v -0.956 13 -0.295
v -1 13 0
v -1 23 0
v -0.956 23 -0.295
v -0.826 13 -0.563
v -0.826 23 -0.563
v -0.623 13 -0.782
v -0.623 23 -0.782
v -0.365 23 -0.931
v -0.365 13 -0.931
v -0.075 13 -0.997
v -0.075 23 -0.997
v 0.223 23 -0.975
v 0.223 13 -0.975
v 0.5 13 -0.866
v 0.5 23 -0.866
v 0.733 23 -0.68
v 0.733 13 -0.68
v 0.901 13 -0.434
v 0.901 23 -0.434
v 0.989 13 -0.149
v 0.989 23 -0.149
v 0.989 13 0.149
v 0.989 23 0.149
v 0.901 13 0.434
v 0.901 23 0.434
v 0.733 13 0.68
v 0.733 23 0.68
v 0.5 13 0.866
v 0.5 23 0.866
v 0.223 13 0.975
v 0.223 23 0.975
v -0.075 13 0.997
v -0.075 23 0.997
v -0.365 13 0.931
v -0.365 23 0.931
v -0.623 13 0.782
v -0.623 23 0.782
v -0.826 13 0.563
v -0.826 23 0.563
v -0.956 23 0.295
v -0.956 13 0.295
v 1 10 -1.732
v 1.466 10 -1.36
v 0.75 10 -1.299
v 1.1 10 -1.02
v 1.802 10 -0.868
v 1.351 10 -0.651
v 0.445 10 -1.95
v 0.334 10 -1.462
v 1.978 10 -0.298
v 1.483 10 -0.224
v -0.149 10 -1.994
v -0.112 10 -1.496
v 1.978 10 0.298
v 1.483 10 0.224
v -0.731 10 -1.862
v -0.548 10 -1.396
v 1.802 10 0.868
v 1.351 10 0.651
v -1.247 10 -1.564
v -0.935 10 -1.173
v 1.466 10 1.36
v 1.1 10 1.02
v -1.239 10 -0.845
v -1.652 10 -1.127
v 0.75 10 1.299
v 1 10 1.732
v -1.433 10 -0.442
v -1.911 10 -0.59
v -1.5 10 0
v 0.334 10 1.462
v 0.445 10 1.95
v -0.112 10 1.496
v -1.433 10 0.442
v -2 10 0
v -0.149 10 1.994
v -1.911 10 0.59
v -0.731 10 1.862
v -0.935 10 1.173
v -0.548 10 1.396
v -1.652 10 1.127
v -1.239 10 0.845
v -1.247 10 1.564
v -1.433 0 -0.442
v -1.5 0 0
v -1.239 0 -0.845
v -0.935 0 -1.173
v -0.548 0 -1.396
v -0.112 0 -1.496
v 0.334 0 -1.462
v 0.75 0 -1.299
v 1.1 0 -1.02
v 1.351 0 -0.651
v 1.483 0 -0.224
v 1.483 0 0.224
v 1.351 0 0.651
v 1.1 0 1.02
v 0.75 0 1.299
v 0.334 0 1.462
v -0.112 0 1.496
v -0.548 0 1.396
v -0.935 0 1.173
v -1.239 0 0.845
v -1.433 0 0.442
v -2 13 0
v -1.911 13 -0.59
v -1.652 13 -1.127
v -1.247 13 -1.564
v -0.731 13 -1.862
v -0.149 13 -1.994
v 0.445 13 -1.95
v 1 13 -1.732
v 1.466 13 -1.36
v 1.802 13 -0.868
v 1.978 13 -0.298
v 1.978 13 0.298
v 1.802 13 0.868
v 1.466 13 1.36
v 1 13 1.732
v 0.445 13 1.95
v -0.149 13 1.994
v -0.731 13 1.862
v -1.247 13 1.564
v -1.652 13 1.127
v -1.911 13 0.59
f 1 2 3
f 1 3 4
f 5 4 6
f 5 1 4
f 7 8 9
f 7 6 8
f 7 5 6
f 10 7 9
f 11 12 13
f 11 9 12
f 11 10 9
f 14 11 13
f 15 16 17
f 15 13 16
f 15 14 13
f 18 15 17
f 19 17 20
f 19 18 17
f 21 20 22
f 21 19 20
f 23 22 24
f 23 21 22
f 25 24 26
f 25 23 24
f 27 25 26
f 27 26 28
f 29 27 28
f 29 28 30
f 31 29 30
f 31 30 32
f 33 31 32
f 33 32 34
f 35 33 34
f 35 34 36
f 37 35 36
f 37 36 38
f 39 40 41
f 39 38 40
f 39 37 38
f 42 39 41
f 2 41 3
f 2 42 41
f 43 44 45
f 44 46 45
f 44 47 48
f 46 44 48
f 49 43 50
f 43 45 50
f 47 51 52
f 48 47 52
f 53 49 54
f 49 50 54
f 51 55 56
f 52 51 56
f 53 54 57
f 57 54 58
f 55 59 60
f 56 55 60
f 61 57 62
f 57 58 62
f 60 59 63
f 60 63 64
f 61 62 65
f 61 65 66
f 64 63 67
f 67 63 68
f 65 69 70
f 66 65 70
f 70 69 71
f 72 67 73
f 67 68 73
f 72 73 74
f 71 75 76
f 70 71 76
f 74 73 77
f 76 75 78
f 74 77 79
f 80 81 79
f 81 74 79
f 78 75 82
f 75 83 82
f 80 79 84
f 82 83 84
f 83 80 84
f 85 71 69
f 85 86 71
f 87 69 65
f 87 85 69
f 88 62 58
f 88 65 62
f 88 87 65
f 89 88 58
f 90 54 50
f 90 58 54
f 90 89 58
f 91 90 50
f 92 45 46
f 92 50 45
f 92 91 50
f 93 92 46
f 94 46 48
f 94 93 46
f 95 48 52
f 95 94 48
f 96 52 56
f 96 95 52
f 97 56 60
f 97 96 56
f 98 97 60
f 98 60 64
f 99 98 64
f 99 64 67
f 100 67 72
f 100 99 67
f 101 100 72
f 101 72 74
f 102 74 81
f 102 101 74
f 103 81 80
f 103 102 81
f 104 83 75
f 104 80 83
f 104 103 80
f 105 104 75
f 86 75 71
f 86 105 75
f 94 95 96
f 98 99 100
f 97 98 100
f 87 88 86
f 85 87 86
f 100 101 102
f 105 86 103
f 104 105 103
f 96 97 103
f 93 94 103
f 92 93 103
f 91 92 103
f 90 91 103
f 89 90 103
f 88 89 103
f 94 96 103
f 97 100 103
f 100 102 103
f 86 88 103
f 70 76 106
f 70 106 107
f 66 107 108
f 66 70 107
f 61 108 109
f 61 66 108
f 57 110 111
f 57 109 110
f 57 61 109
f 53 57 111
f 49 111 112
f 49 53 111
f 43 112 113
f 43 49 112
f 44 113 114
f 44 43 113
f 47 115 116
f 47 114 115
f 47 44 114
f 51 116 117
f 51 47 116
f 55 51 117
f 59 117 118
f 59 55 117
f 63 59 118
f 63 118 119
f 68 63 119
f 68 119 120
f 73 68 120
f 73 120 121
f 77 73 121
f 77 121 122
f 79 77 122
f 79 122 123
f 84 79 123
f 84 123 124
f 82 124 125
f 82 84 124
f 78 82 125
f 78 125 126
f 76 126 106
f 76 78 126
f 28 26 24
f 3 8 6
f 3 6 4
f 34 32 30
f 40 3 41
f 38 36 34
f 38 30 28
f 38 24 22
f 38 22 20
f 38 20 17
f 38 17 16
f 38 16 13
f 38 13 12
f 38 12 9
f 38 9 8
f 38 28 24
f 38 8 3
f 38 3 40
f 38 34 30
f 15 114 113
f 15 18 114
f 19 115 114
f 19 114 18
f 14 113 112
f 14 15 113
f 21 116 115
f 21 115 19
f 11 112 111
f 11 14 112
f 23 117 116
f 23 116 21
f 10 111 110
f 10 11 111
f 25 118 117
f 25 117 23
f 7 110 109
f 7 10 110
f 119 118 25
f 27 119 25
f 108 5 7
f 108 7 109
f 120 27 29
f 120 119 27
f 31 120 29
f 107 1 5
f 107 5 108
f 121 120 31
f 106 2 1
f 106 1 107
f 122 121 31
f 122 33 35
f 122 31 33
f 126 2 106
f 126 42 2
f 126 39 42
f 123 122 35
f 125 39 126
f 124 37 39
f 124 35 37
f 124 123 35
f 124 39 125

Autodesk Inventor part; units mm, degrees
ref_plane "YZ Plane" through (0, 0, 0) normal (1, 0, 0) x (0, 1, 0)
ref_plane "XZ Plane" through (0, 0, 0) normal (0, 1, 0) x (-1, 0, 0)
ref_plane "XY Plane" through (0, 0, 0) normal (0, 0, 1) x (1, 0, 0)
sketch "Sketch1" plane through (0, 0, 0) normal (0, 0, 1) x (1, 0, 0)
  line L0 (0, 23) -> (-1, 23)
  line L1 (-1, 23) -> (-1, 13)
  line L2 (-1, 13) -> (-2, 13)
  line L3 (-2, 13) -> (-2, 10)
  line L4 (-2, 10) -> (-1.5, 10)
  line L5 (-1.5, 10) -> (-1.5, 0)
  line L6 (-1.5, 0) -> (0, 0)
  line L7 (0, 0) -> (0, 23)
  dimension "d0" = 1
  dimension "d1" = 1.5
  dimension "d2" = 2
  dimension "d3" = 10
  dimension "d4" = 10
  dimension "d5" = 3
revolve "Revolution1" add sketch "Sketch1" angle 360 about axis through (0, 0, 0) along (0, 1, 0)
thread "Thread1" size "M2x0.4" class "6g" standard "ANSI Metric M Profile" full length
properties part number "Fitting-1" material "Brass"
